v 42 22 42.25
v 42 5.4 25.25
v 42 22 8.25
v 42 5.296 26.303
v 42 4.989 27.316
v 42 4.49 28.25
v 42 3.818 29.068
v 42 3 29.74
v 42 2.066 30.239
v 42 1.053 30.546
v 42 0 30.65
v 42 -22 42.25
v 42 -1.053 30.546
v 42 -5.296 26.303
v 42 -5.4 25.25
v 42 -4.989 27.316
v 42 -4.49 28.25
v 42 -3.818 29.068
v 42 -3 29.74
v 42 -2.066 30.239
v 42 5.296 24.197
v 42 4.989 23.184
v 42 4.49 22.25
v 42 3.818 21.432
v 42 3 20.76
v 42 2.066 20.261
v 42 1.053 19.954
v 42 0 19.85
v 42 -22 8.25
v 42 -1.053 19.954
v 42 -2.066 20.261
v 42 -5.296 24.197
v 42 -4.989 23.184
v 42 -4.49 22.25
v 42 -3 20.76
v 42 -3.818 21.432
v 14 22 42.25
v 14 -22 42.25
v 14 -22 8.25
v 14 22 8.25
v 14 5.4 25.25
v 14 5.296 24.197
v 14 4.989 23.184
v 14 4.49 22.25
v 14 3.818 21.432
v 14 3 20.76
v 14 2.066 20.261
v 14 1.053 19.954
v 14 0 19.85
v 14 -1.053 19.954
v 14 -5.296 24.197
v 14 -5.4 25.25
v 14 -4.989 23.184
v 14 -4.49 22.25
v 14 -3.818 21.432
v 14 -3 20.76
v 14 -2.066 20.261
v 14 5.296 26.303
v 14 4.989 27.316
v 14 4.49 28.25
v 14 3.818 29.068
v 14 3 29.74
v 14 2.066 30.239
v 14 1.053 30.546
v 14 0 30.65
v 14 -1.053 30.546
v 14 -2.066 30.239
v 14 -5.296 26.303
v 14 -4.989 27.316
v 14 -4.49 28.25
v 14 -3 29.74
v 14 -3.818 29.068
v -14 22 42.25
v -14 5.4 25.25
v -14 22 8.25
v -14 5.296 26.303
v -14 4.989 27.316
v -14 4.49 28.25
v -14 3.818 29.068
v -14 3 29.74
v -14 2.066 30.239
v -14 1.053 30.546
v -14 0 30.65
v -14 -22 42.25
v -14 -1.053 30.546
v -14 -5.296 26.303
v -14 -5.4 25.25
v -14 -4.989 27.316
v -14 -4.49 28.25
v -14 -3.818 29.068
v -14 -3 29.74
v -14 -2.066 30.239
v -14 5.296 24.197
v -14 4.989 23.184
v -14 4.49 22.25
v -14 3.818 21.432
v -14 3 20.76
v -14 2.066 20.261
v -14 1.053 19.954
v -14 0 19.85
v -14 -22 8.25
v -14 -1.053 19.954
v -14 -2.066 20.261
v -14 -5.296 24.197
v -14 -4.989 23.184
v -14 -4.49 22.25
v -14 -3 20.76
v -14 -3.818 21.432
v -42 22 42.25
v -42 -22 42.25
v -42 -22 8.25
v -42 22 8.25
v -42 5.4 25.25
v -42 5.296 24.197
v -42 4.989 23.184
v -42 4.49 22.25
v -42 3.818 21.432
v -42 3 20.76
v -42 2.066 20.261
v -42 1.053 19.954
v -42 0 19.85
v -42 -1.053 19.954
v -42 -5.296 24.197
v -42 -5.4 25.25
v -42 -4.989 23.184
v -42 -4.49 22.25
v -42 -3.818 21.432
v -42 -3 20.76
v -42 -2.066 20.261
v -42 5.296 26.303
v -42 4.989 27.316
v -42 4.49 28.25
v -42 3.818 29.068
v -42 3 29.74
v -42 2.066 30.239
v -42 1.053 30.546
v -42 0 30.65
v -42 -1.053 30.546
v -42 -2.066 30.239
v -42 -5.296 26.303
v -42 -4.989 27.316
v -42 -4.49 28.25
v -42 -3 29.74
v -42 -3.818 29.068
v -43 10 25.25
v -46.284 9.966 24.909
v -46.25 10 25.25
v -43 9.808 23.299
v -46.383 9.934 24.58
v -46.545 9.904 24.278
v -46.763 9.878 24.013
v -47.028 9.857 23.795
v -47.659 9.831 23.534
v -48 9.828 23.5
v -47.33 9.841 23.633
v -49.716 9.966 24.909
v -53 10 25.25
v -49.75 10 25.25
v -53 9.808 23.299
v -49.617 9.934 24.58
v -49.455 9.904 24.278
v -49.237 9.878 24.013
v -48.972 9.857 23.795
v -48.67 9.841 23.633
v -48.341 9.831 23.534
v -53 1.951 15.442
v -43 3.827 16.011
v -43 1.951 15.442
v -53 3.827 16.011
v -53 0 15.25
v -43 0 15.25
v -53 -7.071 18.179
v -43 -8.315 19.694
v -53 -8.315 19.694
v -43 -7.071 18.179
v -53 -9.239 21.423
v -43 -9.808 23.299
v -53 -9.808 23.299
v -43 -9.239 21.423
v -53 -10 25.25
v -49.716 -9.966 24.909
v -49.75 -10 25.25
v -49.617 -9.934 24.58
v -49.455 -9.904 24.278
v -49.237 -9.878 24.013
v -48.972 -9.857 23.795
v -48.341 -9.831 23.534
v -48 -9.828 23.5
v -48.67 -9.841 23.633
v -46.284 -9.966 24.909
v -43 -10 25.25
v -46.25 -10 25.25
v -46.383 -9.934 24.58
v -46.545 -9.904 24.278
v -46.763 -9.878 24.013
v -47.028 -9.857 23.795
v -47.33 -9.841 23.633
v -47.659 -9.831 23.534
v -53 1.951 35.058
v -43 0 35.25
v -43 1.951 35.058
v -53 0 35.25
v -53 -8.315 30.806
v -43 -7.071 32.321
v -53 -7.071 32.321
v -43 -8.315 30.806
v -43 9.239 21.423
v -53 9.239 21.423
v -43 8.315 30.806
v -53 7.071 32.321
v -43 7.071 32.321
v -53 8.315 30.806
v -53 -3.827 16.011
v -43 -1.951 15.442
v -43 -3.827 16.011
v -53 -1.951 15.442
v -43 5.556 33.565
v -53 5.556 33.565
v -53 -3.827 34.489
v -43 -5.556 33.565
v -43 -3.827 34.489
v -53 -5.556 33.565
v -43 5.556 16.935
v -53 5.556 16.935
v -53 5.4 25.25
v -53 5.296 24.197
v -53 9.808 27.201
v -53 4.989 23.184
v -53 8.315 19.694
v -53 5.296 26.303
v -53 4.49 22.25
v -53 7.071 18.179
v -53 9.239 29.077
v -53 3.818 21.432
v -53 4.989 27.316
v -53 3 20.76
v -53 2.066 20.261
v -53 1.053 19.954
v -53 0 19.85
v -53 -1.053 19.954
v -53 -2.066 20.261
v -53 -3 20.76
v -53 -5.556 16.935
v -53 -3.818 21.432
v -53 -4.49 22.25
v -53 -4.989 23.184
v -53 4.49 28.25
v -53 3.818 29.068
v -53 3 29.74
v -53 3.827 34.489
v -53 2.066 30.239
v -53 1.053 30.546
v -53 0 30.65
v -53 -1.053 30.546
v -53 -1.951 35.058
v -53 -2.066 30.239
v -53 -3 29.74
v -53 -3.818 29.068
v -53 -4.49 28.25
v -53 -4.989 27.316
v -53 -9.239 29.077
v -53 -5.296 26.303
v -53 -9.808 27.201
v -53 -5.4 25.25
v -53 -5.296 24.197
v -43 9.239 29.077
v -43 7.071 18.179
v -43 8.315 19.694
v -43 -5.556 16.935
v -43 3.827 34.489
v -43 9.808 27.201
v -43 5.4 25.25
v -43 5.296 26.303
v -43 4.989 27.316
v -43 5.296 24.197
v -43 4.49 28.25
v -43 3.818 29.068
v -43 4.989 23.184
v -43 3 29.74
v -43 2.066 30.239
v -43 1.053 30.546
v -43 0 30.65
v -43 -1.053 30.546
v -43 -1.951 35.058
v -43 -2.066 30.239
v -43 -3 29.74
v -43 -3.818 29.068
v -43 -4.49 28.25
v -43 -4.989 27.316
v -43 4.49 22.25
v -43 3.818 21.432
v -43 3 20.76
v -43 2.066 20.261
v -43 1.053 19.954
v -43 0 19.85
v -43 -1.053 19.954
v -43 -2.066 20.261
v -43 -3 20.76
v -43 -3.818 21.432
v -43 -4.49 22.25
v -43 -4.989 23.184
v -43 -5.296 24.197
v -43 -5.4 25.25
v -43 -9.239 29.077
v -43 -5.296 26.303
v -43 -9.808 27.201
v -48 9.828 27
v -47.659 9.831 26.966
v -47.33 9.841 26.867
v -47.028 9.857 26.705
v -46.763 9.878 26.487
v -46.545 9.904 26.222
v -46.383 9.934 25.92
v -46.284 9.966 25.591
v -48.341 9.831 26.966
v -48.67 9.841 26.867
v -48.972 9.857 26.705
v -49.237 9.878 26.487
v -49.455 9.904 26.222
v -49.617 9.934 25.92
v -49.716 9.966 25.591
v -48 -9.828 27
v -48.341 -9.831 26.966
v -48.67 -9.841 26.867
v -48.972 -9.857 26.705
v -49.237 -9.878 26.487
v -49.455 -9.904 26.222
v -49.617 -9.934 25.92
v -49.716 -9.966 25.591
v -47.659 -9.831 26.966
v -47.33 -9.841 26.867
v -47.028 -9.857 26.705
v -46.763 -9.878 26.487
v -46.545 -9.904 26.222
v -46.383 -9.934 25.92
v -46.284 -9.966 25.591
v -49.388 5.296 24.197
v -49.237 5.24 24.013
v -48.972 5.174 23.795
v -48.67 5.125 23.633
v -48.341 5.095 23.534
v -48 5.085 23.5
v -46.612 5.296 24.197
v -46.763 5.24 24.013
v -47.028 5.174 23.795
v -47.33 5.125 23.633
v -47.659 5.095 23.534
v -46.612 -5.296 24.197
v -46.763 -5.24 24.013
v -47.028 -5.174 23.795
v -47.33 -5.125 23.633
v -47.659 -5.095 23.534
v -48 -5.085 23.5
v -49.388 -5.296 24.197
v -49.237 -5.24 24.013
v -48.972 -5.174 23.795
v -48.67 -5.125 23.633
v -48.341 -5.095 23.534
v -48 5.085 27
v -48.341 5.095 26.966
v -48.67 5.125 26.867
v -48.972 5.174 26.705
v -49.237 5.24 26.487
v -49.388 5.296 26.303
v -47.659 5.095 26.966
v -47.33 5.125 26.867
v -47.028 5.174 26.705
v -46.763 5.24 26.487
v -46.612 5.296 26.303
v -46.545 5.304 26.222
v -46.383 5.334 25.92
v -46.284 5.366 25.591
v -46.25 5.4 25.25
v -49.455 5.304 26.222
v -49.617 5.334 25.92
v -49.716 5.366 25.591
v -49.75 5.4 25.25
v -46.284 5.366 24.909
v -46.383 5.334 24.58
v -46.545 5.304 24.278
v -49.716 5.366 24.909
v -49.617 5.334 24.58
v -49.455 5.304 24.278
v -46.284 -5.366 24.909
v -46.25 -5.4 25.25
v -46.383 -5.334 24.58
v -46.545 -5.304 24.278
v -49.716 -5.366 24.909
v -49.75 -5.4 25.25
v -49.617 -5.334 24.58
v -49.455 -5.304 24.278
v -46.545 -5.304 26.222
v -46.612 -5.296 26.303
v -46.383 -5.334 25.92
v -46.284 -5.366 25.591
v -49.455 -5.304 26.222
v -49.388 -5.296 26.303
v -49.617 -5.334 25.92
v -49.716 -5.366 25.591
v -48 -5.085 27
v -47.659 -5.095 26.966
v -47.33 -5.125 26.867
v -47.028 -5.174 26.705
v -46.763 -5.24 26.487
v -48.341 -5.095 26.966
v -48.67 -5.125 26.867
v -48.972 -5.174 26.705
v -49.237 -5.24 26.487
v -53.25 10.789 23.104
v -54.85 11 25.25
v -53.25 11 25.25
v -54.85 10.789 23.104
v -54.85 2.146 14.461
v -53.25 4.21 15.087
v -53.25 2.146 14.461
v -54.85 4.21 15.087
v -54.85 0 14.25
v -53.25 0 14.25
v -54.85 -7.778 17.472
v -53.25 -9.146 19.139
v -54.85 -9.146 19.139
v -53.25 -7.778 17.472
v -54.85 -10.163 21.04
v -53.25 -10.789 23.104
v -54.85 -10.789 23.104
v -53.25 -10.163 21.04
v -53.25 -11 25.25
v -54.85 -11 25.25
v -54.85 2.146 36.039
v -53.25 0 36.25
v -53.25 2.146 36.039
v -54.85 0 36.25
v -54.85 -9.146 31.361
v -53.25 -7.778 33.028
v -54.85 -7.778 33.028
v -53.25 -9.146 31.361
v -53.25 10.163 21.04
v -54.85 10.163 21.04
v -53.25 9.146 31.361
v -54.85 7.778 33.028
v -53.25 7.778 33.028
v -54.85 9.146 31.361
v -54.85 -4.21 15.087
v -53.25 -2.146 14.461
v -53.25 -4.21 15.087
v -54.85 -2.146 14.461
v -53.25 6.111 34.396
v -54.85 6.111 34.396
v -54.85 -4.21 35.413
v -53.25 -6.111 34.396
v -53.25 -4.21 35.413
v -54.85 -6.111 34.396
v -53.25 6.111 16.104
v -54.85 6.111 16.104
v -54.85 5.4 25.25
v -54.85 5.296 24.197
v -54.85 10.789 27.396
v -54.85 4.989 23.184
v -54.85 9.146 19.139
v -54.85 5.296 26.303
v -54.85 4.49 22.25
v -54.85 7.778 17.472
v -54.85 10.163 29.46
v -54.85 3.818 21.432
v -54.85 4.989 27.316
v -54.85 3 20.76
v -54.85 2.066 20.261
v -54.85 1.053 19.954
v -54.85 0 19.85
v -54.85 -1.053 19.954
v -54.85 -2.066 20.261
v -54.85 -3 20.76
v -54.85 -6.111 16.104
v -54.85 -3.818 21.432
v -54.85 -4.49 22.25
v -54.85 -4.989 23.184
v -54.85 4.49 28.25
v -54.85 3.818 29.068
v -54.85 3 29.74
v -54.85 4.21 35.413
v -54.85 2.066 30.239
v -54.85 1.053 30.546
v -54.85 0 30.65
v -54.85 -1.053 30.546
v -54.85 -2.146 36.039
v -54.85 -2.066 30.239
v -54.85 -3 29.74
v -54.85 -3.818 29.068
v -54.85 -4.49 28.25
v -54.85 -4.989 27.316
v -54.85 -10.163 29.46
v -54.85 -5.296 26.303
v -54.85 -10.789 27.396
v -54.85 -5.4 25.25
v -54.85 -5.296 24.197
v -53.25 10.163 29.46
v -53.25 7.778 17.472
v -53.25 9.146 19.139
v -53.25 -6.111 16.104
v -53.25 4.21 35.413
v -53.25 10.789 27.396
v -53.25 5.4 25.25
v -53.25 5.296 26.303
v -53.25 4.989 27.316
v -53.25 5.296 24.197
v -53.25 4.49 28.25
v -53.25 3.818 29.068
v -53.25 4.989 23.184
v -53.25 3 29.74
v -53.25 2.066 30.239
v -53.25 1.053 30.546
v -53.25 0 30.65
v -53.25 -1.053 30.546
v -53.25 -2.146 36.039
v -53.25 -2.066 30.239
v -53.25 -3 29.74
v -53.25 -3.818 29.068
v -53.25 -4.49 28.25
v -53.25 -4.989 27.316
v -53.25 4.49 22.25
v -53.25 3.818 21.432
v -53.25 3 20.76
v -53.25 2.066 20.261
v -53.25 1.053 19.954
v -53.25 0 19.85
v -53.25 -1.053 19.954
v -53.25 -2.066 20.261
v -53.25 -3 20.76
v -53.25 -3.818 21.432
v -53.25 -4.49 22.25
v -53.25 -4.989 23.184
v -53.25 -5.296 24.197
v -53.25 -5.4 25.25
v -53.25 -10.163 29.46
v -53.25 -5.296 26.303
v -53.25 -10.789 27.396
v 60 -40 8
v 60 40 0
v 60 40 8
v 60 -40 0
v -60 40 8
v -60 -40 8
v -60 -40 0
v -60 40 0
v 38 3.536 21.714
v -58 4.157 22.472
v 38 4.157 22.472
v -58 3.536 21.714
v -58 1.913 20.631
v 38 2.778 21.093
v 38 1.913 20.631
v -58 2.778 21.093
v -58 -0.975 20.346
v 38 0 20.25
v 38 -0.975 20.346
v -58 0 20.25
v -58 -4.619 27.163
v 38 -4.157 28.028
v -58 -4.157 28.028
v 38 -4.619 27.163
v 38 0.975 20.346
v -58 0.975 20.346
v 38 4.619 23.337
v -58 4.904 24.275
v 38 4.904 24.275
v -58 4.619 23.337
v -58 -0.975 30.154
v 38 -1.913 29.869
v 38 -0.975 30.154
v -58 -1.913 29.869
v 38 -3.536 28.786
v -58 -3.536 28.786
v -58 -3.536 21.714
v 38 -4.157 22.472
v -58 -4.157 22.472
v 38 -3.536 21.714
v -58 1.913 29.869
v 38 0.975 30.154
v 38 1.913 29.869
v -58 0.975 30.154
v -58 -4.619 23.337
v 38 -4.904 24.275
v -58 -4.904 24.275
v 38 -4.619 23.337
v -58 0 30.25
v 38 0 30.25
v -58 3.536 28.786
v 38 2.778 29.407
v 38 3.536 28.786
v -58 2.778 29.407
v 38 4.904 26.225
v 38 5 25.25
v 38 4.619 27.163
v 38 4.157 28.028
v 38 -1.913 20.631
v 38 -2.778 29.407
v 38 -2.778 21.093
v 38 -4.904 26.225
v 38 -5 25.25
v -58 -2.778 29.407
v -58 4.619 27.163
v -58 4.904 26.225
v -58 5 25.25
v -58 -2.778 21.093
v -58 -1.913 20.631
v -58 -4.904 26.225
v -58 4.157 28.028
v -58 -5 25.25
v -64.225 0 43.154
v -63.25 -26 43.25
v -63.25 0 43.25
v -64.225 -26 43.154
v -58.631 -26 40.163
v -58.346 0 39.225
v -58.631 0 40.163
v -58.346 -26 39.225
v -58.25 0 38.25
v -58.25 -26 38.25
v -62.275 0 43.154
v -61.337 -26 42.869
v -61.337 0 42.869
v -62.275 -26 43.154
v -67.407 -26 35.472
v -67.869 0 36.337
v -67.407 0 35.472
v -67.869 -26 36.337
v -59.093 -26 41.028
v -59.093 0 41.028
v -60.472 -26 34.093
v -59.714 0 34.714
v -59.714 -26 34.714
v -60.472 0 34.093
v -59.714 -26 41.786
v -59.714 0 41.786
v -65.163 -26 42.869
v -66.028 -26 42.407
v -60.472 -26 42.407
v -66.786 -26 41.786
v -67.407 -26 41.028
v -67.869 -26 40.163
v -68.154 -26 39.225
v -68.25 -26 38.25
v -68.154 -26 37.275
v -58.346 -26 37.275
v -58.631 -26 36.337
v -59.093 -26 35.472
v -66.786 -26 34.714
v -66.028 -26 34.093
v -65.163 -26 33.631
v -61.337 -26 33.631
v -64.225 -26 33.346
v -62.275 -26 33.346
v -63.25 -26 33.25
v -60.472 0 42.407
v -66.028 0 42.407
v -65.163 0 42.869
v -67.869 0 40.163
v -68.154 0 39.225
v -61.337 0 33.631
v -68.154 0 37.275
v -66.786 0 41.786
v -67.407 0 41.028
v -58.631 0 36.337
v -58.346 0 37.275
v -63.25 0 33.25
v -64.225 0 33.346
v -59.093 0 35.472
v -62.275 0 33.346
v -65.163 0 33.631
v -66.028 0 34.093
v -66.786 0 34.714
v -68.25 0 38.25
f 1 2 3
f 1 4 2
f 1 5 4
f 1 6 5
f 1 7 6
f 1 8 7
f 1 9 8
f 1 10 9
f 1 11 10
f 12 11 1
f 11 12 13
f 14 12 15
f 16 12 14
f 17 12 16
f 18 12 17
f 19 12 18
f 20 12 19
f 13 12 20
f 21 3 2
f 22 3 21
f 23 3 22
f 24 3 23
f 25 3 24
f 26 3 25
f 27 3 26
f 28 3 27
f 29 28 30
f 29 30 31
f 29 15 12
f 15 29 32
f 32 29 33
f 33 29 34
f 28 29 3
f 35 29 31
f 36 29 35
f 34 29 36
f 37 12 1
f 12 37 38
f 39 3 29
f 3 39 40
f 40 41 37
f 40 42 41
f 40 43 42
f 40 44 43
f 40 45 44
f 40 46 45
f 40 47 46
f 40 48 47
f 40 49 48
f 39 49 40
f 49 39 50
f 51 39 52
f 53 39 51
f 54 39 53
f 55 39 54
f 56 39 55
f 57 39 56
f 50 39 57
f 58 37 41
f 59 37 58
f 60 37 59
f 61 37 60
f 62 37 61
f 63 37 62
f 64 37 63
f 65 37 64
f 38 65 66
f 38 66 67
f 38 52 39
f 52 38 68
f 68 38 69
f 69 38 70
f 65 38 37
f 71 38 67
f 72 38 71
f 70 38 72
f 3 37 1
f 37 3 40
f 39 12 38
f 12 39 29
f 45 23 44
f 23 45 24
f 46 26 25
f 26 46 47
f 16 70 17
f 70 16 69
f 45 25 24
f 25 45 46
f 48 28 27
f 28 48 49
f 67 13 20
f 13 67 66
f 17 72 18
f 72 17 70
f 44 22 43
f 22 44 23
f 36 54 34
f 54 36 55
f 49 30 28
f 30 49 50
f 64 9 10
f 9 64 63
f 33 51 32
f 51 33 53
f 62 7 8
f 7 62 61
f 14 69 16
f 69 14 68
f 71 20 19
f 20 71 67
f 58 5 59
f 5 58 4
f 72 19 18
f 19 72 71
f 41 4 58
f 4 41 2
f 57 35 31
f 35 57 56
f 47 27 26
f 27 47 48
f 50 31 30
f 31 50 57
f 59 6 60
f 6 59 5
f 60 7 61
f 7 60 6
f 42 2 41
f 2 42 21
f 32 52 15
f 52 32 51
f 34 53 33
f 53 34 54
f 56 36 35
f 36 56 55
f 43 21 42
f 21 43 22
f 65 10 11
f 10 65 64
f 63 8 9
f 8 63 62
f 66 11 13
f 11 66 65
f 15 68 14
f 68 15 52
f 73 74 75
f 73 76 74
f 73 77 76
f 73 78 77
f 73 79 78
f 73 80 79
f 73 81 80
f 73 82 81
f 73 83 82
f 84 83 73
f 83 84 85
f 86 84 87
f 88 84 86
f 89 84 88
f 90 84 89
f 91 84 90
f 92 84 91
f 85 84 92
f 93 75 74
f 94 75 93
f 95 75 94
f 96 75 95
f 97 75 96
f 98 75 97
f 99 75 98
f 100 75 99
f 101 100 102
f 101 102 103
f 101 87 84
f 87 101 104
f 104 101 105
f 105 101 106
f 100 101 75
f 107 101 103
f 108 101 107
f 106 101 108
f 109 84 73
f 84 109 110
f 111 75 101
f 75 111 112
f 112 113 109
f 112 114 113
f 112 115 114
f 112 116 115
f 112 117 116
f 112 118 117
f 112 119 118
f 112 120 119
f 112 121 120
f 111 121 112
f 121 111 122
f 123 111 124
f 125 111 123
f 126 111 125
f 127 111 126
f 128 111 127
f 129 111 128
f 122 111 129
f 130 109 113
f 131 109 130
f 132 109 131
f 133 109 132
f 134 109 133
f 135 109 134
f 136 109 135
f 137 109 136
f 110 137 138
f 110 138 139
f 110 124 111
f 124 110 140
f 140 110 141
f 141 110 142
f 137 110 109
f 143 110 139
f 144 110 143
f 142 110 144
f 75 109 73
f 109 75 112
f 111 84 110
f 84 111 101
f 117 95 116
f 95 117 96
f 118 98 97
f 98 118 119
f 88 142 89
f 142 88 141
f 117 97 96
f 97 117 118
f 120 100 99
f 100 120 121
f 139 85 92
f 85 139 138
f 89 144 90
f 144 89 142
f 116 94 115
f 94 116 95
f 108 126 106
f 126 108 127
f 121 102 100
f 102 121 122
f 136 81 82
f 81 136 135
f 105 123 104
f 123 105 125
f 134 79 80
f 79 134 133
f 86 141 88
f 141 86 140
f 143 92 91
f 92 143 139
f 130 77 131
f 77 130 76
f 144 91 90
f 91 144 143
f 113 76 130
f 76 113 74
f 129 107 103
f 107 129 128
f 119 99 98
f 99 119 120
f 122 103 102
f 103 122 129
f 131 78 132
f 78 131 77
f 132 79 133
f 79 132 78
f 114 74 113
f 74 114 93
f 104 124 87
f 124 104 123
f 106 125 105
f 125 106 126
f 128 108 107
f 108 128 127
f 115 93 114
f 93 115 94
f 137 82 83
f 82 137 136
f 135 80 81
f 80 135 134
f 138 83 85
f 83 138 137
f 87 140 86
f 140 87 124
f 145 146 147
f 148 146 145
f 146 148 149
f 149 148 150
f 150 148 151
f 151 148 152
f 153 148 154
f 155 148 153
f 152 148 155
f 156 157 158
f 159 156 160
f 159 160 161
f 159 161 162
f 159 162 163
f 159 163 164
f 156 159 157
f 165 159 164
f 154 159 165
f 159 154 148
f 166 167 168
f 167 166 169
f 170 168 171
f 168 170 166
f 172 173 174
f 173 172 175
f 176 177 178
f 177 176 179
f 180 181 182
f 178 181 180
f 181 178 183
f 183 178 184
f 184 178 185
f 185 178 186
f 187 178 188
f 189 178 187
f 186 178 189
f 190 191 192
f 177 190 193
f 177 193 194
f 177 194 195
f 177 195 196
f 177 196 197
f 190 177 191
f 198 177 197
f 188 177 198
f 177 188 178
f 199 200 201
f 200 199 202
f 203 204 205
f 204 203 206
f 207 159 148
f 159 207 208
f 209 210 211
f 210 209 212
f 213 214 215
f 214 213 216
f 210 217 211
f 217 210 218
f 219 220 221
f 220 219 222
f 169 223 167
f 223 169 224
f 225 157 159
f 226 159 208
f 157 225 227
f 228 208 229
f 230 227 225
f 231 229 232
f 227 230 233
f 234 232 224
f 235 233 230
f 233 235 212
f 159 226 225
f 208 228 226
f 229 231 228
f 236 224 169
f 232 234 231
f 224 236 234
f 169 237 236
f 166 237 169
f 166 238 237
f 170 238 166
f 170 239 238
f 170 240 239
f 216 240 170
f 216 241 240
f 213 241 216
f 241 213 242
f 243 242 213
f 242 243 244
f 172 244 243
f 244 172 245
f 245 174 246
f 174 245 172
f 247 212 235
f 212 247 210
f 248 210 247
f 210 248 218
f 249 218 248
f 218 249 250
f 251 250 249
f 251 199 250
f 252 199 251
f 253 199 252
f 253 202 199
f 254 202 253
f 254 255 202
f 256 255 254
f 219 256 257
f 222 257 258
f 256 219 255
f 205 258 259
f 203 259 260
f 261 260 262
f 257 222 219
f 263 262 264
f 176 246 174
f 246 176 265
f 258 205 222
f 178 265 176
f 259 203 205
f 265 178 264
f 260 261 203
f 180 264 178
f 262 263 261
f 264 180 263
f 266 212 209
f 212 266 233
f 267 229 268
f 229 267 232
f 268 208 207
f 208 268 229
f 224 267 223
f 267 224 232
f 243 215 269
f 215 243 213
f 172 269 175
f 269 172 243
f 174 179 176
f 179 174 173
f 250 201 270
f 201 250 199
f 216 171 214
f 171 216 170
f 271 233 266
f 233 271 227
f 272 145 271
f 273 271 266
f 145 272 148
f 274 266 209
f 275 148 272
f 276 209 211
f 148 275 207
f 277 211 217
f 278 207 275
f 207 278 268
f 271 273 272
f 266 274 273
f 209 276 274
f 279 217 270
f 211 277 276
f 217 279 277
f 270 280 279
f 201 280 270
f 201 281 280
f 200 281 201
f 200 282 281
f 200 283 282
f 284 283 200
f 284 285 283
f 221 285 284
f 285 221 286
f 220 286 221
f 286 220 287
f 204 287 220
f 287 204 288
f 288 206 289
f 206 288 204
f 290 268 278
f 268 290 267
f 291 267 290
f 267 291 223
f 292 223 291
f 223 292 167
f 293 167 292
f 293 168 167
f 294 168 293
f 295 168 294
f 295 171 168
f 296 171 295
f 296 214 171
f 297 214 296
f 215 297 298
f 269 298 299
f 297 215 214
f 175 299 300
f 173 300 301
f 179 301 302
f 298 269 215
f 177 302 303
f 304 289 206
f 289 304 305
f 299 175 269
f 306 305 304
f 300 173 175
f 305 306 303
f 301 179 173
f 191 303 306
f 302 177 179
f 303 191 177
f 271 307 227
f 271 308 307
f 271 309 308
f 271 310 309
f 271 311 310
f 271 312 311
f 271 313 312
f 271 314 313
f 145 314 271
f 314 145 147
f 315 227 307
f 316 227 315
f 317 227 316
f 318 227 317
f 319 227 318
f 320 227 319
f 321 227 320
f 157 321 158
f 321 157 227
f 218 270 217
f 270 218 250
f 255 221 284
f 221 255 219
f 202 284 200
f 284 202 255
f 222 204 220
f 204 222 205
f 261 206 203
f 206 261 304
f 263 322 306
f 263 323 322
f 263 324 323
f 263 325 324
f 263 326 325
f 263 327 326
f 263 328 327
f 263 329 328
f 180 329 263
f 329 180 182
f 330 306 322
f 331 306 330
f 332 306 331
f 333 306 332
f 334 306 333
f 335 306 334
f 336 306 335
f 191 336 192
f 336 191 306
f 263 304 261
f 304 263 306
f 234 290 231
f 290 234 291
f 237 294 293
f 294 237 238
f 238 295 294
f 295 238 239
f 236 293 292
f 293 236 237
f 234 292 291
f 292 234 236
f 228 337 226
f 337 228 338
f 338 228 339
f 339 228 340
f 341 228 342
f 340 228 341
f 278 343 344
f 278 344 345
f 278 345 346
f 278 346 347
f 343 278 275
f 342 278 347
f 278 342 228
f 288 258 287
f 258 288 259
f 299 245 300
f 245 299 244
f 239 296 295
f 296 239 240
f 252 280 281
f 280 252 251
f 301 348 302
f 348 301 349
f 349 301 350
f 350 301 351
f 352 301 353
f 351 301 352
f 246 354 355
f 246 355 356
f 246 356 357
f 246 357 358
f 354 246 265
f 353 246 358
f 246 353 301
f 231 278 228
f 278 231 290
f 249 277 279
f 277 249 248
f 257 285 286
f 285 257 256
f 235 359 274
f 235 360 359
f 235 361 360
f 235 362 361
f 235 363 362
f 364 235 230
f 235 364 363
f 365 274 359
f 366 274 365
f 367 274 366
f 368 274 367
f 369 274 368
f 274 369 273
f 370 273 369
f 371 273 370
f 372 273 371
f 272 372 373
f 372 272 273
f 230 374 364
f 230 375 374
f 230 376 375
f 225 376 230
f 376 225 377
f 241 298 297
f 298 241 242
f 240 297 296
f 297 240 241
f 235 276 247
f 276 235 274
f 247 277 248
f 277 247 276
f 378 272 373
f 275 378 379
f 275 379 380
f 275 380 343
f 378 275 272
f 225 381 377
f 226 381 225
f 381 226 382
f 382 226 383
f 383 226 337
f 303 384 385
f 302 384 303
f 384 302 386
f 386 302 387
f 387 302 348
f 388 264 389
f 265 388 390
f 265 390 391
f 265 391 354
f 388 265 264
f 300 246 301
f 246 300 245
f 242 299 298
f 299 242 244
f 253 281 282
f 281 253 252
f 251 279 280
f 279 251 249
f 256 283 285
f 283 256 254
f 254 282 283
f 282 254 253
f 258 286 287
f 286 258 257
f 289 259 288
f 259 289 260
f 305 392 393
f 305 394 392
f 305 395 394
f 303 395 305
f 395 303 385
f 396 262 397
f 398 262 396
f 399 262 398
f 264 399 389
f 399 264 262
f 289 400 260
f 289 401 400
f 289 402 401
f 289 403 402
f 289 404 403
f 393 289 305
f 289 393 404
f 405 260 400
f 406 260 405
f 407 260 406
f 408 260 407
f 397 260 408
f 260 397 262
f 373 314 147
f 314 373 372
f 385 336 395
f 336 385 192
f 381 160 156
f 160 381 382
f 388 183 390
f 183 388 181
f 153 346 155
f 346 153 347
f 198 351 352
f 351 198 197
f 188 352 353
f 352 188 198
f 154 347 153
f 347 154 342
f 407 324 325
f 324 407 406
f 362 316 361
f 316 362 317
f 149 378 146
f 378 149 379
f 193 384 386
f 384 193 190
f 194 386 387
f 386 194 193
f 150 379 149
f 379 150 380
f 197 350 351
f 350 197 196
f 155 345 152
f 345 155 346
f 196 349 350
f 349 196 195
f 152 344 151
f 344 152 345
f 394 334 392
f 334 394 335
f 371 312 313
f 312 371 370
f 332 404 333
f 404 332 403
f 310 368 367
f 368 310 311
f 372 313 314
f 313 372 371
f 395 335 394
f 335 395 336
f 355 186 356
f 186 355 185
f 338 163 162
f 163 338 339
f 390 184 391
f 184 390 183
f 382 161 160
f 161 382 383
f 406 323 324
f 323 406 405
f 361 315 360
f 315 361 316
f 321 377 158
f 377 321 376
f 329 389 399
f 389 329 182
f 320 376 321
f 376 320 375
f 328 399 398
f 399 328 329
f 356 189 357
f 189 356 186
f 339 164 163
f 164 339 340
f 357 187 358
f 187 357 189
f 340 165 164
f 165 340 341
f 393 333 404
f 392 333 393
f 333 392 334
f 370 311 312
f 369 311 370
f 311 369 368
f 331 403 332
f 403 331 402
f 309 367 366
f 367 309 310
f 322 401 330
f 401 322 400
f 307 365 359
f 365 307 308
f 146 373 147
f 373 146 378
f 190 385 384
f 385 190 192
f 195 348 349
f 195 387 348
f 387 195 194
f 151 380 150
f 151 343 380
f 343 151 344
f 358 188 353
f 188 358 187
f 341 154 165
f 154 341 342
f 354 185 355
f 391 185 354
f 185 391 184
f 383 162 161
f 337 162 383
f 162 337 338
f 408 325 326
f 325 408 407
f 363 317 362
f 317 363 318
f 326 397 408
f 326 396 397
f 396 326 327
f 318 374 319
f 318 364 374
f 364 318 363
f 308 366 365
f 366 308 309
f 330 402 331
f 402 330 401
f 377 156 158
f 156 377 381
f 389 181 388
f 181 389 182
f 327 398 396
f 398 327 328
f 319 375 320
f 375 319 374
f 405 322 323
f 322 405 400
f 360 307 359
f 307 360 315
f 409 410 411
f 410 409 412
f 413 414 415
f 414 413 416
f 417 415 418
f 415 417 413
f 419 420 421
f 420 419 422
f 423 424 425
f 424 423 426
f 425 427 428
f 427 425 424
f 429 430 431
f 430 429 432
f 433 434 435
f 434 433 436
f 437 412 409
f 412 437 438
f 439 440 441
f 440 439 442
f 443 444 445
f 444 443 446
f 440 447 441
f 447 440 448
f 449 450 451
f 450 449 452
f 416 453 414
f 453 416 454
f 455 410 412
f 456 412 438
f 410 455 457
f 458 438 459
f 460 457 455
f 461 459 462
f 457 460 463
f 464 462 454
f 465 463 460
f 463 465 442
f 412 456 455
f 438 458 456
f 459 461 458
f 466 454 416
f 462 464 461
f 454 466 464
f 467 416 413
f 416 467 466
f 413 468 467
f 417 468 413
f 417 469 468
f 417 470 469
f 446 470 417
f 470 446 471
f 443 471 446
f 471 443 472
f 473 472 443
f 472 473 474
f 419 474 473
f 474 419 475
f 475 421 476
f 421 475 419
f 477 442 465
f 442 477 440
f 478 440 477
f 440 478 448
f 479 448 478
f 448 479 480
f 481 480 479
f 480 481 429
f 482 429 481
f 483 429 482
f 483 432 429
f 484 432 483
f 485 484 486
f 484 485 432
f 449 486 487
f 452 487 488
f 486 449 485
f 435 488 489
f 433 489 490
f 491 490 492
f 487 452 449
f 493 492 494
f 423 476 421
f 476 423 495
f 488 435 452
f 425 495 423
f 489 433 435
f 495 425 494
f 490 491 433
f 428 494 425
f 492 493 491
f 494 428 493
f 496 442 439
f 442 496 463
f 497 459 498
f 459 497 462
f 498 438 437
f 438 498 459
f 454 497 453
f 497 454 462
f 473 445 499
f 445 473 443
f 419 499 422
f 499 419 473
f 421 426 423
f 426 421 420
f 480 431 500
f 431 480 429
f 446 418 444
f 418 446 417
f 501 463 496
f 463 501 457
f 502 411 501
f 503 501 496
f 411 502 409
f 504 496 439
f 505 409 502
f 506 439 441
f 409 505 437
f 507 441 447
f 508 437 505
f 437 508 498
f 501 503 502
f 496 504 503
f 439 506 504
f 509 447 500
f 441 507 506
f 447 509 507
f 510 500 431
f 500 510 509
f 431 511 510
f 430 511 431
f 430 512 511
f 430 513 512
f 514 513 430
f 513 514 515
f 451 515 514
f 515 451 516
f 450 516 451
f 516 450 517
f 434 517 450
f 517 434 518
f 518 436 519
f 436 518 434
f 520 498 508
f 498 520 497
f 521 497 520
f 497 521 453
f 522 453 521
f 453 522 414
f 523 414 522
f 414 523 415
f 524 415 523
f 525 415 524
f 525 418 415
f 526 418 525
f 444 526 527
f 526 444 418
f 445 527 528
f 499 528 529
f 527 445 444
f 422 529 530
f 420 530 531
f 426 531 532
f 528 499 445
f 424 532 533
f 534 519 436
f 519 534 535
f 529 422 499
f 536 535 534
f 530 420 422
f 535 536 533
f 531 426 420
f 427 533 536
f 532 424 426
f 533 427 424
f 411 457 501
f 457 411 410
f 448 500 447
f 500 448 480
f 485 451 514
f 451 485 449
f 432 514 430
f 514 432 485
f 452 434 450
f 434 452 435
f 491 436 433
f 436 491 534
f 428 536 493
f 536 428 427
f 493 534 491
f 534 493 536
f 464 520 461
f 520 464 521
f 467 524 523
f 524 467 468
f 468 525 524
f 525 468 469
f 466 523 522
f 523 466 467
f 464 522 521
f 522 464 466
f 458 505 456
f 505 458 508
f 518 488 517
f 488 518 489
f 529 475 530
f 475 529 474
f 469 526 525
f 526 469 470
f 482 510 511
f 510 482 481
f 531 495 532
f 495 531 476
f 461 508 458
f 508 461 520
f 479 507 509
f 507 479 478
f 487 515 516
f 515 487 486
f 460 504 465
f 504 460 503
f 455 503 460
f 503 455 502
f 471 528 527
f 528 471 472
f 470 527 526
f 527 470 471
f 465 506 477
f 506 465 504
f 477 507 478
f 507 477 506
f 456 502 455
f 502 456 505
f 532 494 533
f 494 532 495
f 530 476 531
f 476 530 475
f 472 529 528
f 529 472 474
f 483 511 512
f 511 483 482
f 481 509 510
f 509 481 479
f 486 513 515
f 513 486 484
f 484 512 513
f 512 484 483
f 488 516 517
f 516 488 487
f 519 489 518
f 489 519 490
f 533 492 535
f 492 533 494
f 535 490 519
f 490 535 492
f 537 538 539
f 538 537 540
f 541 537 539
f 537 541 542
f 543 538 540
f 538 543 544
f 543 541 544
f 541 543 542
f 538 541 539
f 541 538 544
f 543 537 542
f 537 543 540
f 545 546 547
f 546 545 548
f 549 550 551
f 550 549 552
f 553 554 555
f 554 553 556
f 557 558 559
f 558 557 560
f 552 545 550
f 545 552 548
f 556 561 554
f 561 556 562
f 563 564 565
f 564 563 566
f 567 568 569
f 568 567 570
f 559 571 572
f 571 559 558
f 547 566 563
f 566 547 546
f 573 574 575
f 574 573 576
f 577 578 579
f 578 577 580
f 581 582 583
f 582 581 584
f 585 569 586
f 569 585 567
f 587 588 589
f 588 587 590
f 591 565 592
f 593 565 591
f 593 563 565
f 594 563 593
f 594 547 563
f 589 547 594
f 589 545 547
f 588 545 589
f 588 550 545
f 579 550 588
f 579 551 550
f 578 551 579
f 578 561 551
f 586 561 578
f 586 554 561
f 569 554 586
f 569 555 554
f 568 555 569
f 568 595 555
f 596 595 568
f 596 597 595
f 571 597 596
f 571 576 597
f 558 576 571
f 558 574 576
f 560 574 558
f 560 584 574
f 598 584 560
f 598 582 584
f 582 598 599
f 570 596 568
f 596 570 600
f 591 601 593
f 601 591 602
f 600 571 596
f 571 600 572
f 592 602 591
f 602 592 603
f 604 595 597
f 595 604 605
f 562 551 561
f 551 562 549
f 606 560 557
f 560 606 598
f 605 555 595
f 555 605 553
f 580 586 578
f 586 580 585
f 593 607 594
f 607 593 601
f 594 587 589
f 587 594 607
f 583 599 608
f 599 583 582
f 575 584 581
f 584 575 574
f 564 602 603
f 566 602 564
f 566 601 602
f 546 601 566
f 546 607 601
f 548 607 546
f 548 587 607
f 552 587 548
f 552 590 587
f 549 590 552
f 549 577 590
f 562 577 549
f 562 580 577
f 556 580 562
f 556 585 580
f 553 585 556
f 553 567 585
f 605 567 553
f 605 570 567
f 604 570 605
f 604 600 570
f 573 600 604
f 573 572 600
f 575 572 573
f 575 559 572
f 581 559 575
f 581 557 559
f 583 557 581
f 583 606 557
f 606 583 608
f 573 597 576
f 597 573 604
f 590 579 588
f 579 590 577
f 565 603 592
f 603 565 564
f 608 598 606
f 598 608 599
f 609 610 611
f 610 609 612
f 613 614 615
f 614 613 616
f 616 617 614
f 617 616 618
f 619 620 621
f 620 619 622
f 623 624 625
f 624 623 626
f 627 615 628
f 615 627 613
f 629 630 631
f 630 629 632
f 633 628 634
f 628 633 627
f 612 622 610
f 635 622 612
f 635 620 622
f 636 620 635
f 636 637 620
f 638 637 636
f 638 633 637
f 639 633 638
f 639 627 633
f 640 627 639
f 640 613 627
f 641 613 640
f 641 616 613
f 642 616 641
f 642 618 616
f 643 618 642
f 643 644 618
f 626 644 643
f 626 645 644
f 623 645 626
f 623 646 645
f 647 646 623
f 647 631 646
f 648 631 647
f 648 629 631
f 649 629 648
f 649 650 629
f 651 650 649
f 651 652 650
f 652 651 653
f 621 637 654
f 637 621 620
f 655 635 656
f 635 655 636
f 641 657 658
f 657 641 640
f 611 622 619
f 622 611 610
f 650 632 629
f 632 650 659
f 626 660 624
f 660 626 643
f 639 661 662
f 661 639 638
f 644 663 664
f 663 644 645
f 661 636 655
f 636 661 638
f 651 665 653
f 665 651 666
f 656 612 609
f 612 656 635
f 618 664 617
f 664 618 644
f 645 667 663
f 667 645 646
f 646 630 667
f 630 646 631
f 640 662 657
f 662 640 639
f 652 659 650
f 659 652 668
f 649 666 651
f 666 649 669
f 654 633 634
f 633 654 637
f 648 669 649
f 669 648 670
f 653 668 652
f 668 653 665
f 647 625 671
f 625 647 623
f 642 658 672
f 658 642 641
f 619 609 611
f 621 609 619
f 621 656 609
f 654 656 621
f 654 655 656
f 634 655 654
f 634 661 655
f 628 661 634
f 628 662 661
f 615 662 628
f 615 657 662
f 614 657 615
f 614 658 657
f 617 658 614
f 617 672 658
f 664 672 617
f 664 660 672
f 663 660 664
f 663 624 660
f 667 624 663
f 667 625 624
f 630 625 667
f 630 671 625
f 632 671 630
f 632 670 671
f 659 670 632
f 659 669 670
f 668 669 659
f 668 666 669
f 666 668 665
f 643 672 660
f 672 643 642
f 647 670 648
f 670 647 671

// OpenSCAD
$fn = 32;

// ------------------------------------------------------------------------
// Machine vise: screw d10, jaws 28 x 34 mm
// Every part is its own module, assembly() places every instance.
// ------------------------------------------------------------------------

// --- part 1 ---
module vise_bed() {
  difference() {
    translate([-60, -40, 0]) cube([120, 80, 8]);
  }
}

// --- part 2 ---
module vise_jaw() {
  difference() {
    translate([-14, -22, 0]) cube([28, 44, 34]);
    translate([0, 0, 17]) rotate([0, 90, 0]) cylinder(h = 30, d = 10.8, center = true);
  }
}

// --- part 3 ---
module vise_screw() {
  translate([0, 0, -48]) cylinder(h = 96, d = 10);
}

// --- part 4 ---
module screw_collar() {
  difference() {
    cylinder(h = 10, d = 20);
    translate([0, 0, -1]) cylinder(h = 12, d = 10.8);
    translate([0, 0, 5]) rotate([90, 0, 0]) cylinder(h = 22, d = 3.5, center = true);
  }
}

// --- part 5 ---
module screw_washer() {
  difference() {
      translate([0, 0, 0]) cylinder(h = 1.6, d = 22);
      translate([0, 0, -1]) cylinder(h = 3.6, d = 10.8);
    }
}

// --- part 6 ---
module vise_handle() {
  cylinder(h = 26, d = 10);
}

// --- assembly ---
module assembly() {
  color([0.80, 0.24, 0.20]) translate([0, 0, 0]) rotate([0, 0, 0]) vise_bed();
  color([0.20, 0.45, 0.75]) translate([28, 0, 8.25]) rotate([0, 0, 0]) vise_jaw();
  color([0.25, 0.62, 0.32]) translate([-28, 0, 8.25]) rotate([0, 0, 0]) vise_jaw();
  color([0.92, 0.70, 0.18]) translate([-10, 0, 25.25]) rotate([0, 90, 0]) vise_screw();
  color([0.58, 0.35, 0.70]) translate([-53, 0, 25.25]) rotate([0, 90, 0]) screw_collar();
  color([0.16, 0.66, 0.66]) translate([-54.85, 0, 25.25]) rotate([0, 90, 0]) screw_washer();
  color([0.85, 0.48, 0.18]) translate([-63.25, 0, 38.25]) rotate([90, 0, 0]) vise_handle();
}

assembly();
